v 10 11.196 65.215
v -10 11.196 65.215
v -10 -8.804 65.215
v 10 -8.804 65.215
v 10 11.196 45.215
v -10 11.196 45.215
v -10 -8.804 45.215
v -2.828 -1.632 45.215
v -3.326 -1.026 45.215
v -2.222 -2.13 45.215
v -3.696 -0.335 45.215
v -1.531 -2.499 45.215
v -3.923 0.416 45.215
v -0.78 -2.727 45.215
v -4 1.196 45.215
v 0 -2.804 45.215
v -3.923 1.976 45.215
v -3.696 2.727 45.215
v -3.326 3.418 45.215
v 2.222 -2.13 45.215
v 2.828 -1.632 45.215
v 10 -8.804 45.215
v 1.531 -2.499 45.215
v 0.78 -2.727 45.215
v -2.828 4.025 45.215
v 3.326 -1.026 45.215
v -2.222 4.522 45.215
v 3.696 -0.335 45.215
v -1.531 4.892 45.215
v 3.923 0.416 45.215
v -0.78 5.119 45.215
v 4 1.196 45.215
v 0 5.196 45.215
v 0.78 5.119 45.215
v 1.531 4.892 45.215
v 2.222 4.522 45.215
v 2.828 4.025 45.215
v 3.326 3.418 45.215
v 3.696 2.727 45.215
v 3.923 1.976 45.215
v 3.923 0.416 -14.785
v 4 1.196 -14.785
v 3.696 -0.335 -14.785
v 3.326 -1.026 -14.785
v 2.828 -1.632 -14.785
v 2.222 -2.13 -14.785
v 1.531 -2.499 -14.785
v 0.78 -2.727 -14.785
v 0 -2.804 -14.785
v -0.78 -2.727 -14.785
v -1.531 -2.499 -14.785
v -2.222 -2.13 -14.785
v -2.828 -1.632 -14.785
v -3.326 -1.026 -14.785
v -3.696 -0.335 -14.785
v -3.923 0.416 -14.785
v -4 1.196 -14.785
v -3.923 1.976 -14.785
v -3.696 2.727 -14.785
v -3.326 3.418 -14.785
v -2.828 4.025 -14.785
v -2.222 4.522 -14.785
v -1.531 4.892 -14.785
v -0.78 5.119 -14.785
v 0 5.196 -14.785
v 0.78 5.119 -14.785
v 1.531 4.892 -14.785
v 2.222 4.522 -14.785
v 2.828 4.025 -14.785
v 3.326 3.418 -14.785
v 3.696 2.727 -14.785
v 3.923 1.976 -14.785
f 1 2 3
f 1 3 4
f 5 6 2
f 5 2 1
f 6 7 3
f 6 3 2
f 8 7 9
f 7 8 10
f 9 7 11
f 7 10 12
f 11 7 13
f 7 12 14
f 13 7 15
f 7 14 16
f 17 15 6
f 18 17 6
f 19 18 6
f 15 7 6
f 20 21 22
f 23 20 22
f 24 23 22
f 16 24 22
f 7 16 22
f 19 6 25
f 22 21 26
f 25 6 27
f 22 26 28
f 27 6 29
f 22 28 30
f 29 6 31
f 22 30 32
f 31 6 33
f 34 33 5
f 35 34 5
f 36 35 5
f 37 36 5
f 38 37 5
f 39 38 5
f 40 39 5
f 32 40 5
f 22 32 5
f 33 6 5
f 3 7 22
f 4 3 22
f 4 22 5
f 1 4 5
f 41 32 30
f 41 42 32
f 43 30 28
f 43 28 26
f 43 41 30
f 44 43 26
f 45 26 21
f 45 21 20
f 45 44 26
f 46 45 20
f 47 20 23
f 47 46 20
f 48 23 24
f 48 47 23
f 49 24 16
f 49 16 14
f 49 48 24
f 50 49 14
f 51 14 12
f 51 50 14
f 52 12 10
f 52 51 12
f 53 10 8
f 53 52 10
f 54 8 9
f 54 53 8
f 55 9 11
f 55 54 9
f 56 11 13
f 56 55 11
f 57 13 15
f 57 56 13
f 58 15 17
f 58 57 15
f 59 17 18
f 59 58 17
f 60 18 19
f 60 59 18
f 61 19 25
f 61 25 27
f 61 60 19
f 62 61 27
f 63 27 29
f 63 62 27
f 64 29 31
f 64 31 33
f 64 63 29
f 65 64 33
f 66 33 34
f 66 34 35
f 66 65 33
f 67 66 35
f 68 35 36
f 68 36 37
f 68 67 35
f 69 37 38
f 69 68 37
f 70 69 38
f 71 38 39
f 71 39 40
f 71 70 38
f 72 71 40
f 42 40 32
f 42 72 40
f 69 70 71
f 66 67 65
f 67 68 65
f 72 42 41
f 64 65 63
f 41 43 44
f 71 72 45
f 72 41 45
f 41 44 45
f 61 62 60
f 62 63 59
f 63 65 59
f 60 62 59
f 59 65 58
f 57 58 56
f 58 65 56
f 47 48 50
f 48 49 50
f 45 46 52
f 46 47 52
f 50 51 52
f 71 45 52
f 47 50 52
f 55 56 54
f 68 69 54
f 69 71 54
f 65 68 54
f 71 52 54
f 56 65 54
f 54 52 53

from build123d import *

# Parameters (mm, degrees)
SKETCH1_W           = 60
SKETCH1_H           = 4
SKETCH4_W           = 20
SKETCH4_H           = 20
BOSS_EXTRUDE2_DEPTH = 20


with BuildPart() as part:
    # Sketch1 → Revolve1 (revolve)
    with BuildSketch(Plane(origin=(0, 0, 0), x_dir=(0, 0, -1), z_dir=(1, 0, 0)), mode=Mode.PRIVATE) as revolve1_sk:
        with Locations((-15.215395953, 3.196078431)):
            Rectangle(SKETCH1_W, SKETCH1_H)
    revolve(revolve1_sk.sketch.rotate(Axis((0, 1.196078431, 45.215395953), (0, 0, -1)), 90), axis=Axis((0, 1.196078431, 45.215395953), (0, 0, -1)))

    # Sketch4 → Boss-Extrude2 (add)
    with BuildSketch(Plane.XY.offset(45.215395953)):
        with Locations((0, 1.196078431)):
            Rectangle(SKETCH4_W, SKETCH4_H)
    extrude(amount=BOSS_EXTRUDE2_DEPTH)


solid = part.part
